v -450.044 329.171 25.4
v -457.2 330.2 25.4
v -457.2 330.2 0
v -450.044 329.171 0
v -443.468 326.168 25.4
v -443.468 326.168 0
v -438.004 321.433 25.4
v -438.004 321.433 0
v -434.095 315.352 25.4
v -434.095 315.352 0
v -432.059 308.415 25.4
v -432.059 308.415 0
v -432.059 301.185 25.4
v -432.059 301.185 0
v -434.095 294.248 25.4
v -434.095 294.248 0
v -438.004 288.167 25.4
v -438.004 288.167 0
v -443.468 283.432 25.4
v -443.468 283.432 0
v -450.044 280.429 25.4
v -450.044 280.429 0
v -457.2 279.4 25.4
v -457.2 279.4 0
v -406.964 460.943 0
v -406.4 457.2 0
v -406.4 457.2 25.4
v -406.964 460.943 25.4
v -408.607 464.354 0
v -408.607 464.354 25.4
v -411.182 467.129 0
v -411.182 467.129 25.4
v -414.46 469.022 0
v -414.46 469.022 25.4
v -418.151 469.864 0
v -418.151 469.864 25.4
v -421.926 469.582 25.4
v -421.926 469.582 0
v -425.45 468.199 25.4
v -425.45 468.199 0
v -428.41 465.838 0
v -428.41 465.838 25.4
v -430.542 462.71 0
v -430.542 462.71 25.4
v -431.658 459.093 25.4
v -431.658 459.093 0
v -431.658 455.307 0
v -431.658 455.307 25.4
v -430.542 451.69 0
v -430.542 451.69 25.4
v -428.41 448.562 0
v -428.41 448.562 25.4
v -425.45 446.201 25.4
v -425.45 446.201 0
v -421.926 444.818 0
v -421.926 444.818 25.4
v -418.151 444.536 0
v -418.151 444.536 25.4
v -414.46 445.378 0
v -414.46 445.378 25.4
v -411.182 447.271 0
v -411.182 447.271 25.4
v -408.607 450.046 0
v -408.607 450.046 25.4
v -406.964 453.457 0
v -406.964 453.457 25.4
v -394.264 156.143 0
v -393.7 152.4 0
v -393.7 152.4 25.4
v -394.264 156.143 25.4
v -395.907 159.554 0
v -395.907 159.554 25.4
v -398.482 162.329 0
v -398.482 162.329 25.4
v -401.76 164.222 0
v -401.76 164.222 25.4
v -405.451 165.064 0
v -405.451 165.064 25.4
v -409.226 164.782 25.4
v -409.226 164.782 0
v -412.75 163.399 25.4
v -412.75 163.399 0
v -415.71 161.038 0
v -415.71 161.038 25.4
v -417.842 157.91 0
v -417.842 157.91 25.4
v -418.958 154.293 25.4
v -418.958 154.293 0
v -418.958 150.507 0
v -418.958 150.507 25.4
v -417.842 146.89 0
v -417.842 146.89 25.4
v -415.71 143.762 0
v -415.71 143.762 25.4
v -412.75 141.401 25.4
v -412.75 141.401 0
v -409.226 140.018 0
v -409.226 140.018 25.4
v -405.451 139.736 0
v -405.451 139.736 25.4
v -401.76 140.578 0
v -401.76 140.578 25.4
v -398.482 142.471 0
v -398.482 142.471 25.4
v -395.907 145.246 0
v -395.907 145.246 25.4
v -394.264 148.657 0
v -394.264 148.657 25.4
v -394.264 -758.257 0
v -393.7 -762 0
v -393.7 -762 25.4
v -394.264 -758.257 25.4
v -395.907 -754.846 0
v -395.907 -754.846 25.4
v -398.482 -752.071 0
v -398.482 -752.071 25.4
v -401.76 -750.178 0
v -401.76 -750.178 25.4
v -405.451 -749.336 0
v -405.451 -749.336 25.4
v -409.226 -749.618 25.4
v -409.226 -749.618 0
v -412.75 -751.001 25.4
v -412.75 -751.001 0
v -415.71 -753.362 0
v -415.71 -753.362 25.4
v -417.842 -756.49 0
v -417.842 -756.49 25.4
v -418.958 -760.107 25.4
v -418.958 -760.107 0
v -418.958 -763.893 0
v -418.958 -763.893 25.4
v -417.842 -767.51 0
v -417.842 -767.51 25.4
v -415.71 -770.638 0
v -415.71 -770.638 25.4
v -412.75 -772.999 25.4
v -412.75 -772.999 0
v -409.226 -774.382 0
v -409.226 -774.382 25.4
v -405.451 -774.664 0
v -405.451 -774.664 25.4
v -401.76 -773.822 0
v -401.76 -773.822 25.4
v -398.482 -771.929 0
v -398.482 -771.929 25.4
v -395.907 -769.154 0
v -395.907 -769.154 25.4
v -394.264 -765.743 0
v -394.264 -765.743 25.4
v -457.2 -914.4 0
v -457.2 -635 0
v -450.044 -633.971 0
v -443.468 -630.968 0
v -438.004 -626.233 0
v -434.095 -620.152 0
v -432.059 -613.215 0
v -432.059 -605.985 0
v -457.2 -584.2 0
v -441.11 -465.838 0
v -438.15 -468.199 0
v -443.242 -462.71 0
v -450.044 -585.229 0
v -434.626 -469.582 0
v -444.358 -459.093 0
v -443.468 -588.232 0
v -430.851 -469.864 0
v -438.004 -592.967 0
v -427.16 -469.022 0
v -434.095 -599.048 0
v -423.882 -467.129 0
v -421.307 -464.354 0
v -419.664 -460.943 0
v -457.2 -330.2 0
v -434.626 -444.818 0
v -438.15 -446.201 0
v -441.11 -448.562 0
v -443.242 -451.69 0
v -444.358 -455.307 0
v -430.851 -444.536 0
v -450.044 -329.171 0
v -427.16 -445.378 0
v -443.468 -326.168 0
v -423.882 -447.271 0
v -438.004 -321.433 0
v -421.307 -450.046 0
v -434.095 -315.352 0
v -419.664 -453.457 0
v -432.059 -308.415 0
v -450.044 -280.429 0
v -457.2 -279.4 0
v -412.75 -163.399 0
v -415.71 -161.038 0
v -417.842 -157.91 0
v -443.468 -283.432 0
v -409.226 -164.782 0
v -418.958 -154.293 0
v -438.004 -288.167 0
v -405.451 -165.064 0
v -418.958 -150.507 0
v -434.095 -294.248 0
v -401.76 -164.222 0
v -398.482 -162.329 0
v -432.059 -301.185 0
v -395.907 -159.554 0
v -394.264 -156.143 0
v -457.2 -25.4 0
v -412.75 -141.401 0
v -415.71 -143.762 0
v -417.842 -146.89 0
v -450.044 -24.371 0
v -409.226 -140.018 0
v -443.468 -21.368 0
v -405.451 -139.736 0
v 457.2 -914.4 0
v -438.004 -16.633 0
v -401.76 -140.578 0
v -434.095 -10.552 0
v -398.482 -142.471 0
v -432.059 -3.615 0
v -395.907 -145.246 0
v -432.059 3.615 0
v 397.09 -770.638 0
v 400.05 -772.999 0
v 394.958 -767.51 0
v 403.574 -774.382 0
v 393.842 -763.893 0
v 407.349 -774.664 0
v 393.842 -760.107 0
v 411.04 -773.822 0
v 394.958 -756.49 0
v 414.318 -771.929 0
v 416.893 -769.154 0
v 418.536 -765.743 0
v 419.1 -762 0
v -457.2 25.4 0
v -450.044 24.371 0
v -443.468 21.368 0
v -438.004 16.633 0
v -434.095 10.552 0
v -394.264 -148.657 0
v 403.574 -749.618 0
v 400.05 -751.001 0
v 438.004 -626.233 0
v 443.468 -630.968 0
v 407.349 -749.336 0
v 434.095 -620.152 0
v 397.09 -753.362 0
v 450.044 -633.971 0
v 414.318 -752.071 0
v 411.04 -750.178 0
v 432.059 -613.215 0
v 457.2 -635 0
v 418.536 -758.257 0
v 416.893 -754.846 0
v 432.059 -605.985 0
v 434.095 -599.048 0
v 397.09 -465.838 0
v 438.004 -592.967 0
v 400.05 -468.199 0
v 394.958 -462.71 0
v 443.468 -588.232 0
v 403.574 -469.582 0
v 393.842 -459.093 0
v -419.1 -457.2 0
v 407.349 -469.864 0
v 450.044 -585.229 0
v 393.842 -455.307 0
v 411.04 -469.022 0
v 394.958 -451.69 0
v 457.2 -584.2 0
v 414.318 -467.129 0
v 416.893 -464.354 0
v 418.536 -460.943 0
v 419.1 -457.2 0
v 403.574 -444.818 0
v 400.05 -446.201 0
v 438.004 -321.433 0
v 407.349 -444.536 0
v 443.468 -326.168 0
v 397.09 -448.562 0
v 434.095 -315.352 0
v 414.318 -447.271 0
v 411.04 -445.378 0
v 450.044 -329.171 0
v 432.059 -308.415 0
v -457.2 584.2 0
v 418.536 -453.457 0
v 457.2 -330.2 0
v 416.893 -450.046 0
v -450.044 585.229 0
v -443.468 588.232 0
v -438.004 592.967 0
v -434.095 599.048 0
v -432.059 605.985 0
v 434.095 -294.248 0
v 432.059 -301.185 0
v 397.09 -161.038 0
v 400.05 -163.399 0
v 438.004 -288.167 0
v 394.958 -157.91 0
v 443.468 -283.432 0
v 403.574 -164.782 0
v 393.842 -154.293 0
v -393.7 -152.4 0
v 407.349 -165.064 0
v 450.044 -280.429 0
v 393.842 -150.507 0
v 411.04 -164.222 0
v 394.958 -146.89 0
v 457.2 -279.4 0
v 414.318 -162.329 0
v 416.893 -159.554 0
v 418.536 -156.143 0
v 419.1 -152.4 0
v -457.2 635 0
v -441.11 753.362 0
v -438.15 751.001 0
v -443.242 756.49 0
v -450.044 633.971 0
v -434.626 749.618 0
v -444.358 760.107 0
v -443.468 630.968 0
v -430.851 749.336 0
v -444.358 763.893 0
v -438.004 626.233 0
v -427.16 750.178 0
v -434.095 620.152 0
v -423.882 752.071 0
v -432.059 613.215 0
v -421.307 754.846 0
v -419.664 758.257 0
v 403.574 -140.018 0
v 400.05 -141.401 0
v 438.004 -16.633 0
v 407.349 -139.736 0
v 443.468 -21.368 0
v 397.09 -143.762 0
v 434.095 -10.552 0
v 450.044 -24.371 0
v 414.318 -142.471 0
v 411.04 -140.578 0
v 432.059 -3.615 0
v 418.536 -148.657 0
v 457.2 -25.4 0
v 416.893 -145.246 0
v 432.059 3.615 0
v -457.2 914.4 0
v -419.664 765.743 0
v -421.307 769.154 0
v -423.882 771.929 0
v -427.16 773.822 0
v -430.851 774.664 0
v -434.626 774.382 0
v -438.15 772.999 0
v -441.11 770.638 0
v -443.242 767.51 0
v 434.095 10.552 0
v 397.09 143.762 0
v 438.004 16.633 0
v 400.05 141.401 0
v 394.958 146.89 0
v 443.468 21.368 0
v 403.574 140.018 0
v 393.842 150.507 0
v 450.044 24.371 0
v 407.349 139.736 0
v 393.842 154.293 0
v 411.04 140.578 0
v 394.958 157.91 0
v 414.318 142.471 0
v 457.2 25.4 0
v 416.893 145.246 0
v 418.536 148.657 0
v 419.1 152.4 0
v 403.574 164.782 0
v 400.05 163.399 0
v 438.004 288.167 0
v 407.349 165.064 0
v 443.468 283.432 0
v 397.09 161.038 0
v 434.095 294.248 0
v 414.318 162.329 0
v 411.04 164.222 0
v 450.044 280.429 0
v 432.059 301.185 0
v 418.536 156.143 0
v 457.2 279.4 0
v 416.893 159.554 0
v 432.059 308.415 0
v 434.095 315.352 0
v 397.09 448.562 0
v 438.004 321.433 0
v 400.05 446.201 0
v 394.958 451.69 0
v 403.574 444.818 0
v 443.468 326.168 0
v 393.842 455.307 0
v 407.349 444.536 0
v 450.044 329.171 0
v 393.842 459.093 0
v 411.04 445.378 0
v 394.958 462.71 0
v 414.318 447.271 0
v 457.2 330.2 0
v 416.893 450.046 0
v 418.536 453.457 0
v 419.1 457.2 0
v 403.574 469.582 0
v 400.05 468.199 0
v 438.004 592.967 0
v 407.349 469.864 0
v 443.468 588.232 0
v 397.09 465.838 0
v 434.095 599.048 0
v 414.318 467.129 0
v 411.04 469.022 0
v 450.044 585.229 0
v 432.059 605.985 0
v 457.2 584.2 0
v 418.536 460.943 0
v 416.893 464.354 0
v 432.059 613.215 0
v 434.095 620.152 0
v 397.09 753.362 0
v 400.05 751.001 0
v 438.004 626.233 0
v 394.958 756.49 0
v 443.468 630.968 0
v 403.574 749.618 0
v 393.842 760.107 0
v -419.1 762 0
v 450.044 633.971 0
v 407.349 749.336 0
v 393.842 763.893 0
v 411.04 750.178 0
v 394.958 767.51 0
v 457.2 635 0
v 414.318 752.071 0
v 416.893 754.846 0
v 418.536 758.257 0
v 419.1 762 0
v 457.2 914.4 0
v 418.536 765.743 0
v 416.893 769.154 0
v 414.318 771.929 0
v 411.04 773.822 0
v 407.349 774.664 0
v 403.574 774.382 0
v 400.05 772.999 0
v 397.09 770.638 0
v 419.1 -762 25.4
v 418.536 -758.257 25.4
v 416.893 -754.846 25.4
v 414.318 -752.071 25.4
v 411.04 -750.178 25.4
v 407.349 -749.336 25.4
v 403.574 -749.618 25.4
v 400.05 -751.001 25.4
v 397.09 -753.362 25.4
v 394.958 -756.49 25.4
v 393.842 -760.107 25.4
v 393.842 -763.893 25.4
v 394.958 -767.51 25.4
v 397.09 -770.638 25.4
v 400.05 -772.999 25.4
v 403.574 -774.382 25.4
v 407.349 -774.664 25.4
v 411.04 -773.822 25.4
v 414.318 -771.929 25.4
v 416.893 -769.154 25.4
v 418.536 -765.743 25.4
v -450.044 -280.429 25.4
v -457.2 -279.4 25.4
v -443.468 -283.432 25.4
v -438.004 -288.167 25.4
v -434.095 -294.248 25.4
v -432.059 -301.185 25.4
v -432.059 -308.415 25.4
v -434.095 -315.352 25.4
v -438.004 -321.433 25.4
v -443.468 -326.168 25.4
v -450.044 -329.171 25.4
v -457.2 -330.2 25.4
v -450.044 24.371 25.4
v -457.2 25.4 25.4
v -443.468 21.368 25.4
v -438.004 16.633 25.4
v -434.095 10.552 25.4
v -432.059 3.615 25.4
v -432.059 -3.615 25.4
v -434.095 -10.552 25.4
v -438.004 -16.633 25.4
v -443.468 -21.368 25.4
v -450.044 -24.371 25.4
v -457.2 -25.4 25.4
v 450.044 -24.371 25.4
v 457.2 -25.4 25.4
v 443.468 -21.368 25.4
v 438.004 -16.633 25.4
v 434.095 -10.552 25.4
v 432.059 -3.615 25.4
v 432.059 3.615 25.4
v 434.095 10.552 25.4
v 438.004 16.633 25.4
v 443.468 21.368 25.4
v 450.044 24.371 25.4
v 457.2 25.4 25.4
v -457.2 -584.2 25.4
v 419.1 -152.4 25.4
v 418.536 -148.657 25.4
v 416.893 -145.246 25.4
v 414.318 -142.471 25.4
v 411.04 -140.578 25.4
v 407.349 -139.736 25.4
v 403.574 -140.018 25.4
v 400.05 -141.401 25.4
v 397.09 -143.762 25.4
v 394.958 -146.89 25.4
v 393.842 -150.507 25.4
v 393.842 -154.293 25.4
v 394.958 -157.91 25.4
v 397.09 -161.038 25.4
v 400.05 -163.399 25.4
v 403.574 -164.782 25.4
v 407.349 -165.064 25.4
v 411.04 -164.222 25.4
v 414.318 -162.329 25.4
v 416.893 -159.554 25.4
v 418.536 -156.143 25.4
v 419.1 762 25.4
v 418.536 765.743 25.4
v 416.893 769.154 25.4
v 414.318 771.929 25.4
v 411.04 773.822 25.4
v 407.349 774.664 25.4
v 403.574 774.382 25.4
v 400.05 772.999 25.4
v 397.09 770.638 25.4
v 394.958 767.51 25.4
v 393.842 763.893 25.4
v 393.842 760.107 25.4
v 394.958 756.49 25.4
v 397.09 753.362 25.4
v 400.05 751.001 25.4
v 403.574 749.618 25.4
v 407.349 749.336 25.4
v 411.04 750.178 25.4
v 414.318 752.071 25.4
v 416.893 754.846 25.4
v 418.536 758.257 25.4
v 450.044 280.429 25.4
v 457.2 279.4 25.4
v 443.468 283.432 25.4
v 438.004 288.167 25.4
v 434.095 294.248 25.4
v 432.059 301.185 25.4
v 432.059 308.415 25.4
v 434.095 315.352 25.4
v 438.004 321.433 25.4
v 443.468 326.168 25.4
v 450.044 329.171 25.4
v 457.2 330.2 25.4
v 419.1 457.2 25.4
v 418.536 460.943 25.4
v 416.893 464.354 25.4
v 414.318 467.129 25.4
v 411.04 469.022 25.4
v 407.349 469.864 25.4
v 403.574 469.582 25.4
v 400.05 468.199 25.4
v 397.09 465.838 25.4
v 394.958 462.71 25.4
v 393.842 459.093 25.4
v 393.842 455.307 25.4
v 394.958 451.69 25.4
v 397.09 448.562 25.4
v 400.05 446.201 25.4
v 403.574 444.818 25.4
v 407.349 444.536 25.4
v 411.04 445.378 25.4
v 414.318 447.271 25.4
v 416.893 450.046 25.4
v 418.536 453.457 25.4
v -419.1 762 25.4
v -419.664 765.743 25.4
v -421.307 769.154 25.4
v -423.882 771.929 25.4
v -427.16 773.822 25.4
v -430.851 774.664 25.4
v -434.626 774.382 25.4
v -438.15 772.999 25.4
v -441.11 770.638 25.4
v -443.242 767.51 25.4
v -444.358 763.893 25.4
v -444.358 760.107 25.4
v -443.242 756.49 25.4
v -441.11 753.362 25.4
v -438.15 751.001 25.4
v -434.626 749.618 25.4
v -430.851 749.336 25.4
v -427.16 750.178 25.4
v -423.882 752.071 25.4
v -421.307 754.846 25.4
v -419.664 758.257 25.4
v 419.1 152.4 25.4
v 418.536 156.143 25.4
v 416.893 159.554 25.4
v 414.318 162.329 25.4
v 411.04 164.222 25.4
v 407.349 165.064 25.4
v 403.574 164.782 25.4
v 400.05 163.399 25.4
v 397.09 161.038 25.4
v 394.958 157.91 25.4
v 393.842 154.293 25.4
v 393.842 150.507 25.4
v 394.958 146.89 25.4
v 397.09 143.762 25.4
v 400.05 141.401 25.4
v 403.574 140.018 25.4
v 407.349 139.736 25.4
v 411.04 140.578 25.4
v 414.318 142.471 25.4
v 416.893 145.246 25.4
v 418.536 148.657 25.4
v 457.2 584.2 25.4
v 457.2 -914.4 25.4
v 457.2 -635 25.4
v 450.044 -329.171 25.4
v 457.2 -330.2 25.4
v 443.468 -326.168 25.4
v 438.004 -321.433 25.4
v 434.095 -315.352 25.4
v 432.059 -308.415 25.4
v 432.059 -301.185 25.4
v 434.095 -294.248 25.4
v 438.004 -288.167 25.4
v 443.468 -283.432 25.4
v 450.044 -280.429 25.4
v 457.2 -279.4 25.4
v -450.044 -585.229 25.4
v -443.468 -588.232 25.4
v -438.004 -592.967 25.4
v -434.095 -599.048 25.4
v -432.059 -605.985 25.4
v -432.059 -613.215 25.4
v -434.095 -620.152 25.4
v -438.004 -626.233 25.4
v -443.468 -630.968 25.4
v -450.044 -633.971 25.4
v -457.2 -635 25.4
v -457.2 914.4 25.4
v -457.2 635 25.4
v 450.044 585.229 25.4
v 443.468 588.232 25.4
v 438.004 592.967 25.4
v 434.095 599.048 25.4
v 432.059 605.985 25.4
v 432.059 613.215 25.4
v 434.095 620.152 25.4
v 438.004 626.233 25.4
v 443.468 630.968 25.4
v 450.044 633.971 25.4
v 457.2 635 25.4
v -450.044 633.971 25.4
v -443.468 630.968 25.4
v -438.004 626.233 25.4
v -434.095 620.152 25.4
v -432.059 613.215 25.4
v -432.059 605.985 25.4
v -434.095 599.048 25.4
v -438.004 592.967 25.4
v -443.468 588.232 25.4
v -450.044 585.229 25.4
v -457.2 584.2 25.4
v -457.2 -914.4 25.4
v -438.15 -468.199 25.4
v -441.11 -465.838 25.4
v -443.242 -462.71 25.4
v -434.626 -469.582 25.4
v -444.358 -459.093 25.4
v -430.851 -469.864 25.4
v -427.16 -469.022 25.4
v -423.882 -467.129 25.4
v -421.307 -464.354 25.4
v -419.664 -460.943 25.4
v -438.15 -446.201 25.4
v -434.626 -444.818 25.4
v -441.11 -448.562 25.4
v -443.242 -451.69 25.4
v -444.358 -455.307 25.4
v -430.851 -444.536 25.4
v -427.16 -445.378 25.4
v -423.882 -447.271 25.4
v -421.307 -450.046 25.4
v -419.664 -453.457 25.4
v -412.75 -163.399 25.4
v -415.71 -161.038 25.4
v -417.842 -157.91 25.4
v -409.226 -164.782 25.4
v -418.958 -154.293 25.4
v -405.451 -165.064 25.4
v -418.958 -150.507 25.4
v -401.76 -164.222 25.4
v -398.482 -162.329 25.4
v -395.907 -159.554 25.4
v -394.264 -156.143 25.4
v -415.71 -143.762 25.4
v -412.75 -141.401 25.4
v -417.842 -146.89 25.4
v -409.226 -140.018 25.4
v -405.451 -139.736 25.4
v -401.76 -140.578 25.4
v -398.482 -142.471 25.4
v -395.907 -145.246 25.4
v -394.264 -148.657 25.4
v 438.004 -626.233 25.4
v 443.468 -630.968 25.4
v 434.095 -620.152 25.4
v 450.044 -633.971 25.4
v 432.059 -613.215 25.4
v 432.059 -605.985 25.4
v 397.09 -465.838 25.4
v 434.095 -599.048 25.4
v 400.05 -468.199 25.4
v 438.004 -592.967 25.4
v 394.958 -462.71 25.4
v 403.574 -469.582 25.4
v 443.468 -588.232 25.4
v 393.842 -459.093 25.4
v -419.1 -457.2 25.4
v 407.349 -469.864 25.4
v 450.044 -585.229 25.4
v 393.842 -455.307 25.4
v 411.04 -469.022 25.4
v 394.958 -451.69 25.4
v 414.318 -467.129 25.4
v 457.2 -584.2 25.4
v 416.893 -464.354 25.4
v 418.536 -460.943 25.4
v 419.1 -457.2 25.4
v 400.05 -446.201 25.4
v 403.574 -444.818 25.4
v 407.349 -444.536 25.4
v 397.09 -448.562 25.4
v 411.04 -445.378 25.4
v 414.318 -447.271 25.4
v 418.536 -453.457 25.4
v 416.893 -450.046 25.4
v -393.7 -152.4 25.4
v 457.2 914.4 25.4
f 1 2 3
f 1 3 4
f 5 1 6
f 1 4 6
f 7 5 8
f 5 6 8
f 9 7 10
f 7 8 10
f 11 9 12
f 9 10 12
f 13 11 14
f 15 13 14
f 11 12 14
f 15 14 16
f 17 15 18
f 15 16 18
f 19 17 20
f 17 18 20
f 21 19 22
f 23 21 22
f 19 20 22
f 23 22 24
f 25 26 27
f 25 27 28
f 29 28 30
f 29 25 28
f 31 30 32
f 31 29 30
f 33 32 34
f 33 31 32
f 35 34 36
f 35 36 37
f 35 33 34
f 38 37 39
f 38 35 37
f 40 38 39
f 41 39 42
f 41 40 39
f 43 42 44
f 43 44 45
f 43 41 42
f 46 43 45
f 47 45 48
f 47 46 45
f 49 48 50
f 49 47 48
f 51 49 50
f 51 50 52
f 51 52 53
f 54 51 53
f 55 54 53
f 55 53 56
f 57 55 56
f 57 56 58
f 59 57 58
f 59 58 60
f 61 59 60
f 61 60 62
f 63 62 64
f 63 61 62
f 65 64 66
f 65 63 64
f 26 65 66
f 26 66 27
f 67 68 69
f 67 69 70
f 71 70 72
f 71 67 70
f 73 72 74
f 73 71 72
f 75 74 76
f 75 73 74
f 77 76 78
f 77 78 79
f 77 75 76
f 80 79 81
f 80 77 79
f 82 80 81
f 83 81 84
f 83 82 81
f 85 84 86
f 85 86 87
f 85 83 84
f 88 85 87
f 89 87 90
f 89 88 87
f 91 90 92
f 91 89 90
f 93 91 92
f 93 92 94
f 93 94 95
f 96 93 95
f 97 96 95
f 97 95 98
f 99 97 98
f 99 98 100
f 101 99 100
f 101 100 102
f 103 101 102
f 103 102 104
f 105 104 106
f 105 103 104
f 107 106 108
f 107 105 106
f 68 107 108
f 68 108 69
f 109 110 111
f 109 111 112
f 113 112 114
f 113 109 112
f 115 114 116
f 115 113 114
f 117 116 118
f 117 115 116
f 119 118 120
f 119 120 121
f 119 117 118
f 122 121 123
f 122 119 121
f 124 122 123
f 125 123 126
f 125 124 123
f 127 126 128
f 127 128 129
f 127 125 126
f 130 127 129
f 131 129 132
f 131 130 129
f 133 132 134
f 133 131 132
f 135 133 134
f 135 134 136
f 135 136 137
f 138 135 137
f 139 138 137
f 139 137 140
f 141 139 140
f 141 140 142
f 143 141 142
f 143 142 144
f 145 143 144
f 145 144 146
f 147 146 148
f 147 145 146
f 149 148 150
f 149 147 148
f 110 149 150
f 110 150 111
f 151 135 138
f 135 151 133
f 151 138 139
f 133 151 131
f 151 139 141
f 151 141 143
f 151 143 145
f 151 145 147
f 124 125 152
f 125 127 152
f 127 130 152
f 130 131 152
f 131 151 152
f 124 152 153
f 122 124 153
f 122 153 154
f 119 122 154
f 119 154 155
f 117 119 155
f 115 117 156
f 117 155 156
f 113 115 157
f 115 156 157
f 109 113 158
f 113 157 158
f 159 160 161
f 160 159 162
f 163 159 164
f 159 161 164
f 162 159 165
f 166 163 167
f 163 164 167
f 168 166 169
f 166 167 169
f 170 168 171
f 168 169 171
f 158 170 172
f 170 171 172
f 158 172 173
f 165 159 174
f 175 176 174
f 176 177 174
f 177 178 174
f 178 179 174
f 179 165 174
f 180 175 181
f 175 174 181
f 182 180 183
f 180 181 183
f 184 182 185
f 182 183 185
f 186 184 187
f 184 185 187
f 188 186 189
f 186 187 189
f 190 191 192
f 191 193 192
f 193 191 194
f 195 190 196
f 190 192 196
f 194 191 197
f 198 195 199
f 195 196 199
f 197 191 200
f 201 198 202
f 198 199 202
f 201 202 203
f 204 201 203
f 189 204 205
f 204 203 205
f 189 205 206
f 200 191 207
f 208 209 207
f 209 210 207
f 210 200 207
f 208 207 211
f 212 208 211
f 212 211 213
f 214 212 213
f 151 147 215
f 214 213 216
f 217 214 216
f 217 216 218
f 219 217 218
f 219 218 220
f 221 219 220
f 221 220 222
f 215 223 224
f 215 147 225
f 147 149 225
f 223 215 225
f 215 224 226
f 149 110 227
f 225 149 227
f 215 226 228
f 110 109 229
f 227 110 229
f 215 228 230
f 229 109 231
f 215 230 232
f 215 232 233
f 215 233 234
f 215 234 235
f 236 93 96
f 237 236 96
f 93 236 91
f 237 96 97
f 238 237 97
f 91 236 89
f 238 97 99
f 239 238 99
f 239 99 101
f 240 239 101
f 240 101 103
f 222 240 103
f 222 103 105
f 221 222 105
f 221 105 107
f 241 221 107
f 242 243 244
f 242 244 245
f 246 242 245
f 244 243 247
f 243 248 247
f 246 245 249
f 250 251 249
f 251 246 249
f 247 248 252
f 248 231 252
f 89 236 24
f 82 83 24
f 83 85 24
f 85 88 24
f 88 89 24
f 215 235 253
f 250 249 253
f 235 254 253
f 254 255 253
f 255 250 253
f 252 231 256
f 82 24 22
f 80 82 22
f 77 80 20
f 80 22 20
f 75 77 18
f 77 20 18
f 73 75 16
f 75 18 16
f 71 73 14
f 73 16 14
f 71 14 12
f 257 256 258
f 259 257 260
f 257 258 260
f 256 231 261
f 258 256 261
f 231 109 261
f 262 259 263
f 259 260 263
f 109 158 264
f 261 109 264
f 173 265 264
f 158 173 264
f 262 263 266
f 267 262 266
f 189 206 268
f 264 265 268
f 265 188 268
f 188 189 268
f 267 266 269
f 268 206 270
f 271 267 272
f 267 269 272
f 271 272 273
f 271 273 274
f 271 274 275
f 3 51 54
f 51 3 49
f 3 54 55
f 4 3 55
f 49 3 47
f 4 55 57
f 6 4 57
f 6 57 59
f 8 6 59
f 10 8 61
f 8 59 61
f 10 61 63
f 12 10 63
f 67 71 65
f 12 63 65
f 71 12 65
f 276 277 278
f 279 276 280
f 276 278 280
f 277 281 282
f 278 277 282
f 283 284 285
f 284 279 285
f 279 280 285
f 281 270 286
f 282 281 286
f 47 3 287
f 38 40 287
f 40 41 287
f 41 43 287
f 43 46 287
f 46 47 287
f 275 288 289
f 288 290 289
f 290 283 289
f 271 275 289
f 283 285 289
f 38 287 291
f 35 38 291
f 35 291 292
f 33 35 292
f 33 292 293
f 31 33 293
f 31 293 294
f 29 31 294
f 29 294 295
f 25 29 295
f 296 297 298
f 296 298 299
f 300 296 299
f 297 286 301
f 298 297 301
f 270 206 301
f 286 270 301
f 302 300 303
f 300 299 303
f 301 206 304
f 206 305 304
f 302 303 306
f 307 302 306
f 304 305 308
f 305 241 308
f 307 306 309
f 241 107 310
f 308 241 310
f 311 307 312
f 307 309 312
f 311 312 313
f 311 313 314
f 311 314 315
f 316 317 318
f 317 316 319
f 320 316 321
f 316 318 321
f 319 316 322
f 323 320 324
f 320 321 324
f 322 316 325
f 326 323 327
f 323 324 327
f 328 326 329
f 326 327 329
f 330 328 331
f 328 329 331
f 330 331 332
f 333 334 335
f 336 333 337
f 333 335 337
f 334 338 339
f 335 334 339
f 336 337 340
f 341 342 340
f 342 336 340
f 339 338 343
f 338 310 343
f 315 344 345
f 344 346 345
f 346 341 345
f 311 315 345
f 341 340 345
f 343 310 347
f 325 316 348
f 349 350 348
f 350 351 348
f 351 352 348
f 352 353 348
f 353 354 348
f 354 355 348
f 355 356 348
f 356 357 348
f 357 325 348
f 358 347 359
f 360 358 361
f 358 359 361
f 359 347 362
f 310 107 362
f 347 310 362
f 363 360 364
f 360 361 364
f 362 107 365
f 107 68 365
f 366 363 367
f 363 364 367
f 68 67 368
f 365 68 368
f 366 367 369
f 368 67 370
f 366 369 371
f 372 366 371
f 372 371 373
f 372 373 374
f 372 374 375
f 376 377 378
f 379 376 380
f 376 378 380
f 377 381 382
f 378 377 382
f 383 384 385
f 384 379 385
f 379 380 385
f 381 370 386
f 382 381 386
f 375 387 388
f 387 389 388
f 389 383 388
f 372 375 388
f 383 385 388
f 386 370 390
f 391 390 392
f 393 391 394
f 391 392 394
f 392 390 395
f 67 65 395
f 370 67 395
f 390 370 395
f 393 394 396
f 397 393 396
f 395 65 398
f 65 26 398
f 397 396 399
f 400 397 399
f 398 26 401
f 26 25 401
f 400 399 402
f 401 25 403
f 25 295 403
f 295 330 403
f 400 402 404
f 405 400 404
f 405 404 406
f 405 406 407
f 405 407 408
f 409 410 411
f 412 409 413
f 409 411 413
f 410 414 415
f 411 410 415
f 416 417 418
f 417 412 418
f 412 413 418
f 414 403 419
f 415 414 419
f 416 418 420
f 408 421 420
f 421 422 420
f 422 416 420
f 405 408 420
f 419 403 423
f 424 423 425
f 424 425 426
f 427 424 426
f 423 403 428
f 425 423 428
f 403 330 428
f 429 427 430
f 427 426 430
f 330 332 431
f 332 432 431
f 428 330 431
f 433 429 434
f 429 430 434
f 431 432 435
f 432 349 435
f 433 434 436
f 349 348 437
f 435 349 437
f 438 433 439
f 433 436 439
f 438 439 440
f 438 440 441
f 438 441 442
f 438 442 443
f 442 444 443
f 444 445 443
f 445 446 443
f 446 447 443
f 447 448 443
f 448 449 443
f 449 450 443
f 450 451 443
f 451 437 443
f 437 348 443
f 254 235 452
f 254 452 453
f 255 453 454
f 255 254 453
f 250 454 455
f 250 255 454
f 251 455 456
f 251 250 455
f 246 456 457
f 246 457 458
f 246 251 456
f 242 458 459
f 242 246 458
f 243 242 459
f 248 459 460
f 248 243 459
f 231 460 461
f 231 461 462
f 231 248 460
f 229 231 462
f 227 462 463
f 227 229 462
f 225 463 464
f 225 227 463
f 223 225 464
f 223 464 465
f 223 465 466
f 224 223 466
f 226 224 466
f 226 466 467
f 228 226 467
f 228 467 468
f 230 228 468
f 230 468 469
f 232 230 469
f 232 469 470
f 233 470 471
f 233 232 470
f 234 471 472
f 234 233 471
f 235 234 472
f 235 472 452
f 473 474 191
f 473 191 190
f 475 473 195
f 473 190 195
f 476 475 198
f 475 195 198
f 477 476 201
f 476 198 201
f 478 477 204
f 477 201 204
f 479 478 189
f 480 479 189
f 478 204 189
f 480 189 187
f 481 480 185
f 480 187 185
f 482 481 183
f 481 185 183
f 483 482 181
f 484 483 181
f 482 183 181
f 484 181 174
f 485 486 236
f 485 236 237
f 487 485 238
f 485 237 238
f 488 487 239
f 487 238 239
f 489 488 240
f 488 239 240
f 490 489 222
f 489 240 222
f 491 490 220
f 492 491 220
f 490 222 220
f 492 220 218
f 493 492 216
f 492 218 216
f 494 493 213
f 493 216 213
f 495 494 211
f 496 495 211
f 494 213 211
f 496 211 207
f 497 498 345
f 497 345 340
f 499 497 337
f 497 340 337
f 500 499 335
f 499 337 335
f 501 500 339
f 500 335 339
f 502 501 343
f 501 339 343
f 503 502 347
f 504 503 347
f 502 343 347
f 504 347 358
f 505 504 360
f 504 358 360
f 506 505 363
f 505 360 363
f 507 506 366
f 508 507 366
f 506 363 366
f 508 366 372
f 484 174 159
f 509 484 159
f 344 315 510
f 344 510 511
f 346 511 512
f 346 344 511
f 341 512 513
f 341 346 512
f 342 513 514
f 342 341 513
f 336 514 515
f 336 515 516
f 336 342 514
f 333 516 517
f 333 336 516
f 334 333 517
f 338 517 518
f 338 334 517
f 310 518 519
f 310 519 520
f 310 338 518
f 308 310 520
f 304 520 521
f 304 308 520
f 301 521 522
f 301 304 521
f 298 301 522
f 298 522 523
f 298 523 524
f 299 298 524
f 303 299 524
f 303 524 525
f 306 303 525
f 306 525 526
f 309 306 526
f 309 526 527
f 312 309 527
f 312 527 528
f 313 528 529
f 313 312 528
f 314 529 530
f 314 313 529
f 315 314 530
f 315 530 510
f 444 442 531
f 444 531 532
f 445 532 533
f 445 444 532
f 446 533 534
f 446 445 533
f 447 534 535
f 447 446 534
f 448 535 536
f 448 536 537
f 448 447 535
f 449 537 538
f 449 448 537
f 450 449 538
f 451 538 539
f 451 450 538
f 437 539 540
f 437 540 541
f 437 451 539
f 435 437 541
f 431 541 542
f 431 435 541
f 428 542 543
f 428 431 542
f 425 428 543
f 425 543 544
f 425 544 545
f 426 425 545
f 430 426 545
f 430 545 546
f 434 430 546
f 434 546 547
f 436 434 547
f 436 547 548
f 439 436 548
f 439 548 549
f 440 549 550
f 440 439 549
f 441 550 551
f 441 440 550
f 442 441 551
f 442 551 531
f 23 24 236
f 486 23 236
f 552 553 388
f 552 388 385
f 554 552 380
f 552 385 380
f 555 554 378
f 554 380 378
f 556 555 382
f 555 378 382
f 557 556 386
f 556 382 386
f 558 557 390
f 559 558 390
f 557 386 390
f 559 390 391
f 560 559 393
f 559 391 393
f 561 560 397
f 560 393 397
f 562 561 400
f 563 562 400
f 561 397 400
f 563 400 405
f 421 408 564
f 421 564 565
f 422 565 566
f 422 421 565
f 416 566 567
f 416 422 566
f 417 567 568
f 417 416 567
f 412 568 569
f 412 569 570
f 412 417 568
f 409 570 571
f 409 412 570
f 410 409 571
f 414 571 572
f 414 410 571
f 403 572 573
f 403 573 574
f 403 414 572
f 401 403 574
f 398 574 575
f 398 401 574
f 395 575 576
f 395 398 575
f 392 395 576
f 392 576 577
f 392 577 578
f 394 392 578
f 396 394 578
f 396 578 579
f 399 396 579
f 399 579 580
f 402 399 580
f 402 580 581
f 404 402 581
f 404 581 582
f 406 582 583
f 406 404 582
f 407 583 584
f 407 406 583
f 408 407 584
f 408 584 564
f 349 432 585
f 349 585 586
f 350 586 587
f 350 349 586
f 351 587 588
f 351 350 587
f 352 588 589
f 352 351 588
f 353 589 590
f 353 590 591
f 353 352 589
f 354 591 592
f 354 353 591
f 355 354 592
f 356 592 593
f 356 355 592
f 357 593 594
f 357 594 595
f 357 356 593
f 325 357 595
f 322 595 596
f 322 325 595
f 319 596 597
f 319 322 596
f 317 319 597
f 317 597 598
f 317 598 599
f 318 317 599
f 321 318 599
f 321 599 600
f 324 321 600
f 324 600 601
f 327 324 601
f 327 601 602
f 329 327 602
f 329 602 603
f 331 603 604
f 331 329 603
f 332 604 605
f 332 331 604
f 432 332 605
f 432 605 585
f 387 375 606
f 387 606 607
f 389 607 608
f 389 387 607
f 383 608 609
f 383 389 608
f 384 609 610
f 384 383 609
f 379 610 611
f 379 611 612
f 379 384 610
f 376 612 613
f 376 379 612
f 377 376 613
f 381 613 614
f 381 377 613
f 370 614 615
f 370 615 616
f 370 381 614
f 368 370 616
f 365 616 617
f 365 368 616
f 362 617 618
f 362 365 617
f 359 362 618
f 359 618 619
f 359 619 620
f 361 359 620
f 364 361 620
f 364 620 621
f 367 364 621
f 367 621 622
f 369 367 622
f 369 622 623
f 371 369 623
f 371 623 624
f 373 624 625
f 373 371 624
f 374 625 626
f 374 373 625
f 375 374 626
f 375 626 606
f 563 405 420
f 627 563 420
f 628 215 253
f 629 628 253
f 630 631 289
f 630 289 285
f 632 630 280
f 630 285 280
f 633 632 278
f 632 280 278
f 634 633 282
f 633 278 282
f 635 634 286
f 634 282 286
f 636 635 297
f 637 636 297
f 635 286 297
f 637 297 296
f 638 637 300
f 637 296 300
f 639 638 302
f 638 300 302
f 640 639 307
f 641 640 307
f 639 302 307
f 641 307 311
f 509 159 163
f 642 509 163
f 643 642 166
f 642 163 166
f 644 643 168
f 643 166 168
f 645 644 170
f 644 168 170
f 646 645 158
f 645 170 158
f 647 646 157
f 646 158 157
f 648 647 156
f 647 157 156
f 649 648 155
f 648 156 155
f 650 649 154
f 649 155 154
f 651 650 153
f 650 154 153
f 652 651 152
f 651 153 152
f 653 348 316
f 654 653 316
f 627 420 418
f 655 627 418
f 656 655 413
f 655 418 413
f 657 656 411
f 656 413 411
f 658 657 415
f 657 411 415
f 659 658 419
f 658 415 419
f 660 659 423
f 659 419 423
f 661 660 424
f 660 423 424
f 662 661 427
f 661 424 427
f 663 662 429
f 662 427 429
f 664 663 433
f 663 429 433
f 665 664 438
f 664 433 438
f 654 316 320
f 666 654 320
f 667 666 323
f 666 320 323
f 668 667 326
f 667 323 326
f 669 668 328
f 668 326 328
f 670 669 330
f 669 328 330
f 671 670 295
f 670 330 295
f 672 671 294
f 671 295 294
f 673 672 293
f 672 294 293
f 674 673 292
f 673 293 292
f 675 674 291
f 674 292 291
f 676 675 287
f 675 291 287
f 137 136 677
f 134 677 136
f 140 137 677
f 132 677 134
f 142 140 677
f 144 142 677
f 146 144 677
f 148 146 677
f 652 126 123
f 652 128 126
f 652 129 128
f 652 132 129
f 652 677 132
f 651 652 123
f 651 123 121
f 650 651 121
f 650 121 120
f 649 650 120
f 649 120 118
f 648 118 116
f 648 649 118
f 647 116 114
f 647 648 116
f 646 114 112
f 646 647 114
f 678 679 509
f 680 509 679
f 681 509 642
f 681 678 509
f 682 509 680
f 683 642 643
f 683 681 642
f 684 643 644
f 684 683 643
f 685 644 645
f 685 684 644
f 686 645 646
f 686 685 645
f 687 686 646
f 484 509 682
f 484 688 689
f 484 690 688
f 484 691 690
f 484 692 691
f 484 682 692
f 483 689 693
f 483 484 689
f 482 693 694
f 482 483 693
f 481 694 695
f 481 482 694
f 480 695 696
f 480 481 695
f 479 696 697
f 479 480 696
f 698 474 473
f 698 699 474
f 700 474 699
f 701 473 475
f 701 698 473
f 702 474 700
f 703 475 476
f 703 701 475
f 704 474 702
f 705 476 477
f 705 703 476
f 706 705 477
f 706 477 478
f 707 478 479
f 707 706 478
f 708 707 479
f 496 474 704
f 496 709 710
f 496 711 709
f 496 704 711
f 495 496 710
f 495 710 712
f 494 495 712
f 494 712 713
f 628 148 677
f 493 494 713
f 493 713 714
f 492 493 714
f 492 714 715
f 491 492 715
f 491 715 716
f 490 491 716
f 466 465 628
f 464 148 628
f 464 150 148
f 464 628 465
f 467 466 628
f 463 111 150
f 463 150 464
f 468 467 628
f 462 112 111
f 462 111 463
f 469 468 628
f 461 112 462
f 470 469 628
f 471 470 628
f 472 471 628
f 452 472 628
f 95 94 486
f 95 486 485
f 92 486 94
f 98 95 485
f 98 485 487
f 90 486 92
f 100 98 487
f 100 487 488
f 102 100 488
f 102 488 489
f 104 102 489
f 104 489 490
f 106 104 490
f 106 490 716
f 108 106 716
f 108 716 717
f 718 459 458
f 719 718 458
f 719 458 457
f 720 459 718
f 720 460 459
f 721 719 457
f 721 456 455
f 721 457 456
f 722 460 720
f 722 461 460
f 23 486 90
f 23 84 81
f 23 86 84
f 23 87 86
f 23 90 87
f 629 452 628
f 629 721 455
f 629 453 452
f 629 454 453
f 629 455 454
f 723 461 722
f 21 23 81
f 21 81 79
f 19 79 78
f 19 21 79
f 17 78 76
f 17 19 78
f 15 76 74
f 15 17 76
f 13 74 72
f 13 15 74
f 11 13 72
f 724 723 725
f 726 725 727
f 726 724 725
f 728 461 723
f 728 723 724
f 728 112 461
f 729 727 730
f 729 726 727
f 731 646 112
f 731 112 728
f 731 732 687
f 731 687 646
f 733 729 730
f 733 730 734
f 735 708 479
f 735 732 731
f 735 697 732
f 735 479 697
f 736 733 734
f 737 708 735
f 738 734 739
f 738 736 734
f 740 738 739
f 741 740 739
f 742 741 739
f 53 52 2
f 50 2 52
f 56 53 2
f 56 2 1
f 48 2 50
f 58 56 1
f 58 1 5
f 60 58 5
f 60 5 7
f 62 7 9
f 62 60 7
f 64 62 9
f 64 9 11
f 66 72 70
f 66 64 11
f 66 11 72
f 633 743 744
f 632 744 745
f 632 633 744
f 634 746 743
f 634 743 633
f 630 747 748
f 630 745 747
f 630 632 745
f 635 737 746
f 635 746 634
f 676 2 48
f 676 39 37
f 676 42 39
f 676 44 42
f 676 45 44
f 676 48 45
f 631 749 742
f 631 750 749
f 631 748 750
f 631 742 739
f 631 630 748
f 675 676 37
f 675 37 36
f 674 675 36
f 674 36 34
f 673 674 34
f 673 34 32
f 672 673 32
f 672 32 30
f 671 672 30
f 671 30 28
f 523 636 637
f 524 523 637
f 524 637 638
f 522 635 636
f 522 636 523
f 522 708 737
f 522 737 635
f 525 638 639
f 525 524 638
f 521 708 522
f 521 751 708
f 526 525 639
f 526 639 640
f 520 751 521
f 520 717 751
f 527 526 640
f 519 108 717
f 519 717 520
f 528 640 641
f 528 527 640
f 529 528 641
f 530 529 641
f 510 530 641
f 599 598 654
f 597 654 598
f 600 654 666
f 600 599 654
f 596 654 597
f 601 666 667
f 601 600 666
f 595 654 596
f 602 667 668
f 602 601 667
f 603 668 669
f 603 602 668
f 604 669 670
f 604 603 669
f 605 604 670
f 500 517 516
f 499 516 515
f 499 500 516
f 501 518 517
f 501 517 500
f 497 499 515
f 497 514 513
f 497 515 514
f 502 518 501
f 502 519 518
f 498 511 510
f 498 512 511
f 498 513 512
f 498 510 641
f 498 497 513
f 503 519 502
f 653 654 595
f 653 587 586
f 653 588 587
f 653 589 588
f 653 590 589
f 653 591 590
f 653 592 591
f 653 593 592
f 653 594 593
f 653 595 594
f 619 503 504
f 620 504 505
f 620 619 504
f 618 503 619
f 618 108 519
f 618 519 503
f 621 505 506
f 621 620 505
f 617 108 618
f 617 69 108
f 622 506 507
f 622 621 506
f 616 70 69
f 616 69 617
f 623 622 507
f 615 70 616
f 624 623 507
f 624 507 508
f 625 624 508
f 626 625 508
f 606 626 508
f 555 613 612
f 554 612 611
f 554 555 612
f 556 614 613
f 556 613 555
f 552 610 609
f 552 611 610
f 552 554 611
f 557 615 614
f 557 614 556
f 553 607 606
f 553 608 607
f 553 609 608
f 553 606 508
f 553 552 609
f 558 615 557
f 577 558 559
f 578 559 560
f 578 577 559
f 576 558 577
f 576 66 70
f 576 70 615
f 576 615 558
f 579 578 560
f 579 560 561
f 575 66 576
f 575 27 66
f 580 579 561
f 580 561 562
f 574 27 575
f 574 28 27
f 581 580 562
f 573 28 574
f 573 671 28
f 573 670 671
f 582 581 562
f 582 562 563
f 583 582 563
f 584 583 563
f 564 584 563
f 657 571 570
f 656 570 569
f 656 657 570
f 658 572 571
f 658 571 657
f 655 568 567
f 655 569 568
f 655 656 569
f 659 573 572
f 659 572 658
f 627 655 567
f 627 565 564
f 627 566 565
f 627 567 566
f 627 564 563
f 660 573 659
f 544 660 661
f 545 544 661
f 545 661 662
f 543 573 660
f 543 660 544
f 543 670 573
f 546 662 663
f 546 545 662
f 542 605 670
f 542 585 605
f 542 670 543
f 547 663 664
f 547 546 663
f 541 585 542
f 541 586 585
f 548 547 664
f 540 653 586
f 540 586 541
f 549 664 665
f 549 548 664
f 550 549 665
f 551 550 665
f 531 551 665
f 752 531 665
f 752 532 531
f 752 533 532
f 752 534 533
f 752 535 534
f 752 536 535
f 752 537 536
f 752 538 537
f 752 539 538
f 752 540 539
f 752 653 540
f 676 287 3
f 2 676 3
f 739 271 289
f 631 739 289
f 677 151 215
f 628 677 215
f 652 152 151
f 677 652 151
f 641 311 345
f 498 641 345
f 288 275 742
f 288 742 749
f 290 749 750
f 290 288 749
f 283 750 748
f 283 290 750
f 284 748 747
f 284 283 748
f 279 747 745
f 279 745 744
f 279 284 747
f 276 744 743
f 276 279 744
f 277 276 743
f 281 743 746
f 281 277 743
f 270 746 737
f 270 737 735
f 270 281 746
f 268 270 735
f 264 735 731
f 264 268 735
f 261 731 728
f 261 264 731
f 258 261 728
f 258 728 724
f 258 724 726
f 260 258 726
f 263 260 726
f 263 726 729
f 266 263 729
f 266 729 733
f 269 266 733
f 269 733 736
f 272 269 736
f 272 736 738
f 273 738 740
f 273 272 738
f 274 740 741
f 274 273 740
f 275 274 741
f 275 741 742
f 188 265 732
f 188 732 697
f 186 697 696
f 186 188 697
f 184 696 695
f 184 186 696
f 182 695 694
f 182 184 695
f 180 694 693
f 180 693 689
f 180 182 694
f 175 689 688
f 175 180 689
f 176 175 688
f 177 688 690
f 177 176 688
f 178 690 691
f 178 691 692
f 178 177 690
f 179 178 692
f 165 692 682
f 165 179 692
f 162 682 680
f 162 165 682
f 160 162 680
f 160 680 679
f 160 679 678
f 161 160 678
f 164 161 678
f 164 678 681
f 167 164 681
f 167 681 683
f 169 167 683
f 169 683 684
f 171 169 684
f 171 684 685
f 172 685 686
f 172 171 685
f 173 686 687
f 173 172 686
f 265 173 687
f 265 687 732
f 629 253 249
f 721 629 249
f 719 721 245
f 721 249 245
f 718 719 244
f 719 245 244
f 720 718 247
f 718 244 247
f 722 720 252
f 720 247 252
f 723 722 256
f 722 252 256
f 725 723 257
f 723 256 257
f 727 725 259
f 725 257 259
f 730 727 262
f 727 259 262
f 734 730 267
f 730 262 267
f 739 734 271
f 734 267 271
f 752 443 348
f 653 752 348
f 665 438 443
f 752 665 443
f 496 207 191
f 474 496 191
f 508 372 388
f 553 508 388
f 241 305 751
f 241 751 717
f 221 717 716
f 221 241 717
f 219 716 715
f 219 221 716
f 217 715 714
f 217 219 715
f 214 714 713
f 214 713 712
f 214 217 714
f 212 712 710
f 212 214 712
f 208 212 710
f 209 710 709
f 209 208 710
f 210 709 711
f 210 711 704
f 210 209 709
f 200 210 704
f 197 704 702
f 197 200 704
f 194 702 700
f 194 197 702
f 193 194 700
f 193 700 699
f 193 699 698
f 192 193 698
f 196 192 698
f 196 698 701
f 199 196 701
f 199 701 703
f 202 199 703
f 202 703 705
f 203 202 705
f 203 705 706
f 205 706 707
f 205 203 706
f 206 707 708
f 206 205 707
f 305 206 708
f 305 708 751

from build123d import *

# Parameters (mm, degrees)
F0_R     = 12.7
F1_DEPTH = 25.4


with BuildPart() as f1:
    # F0 (on Top) → F1 (new body)
    with BuildSketch(Plane.XY):
        with BuildLine():
            Line((-457.2, -914.4), (457.2, -914.4))
            Line((457.2, -914.4), (457.2, -635))
            ThreePointArc((457.2, -635), (431.8, -609.6), (457.2, -584.2))
            Line((457.2, -584.2), (457.2, -330.2))
            ThreePointArc((457.2, -330.2), (431.8, -304.8), (457.2, -279.4))
            Line((457.2, -279.4), (457.2, -25.4))
            ThreePointArc((457.2, -25.4), (431.8, 0), (457.2, 25.4))
            Line((457.2, 25.4), (457.2, 279.4))
            ThreePointArc((457.2, 279.4), (431.8, 304.8), (457.2, 330.2))
            Line((457.2, 330.2), (457.2, 584.2))
            ThreePointArc((457.2, 584.2), (431.8, 609.6), (457.2, 635))
            Line((457.2, 635), (457.2, 914.4))
            Line((457.2, 914.4), (-457.2, 914.4))
            Line((-457.2, 914.4), (-457.2, 635))
            ThreePointArc((-457.2, 635), (-431.8, 609.6), (-457.2, 584.2))
            Line((-457.2, 584.2), (-457.2, 330.2))
            ThreePointArc((-457.2, 330.2), (-431.8, 304.8), (-457.2, 279.4))
            Line((-457.2, 279.4), (-457.2, 25.4))
            ThreePointArc((-457.2, 25.4), (-431.8, 0), (-457.2, -25.4))
            Line((-457.2, -25.4), (-457.2, -279.4))
            ThreePointArc((-457.2, -279.4), (-431.8, -304.8), (-457.2, -330.2))
            Line((-457.2, -330.2), (-457.2, -584.2))
            ThreePointArc((-457.2, -584.2), (-431.8, -609.6), (-457.2, -635))
            Line((-457.2, -635), (-457.2, -914.4))
        make_face()
        with Locations((-406.4, -762)):
            Circle(F0_R, mode=Mode.SUBTRACT)
        with Locations((-431.8, -457.2)):
            Circle(F0_R, mode=Mode.SUBTRACT)
        with Locations((-406.4, -152.4)):
            Circle(F0_R, mode=Mode.SUBTRACT)
        with Locations((406.4, -762)):
            Circle(F0_R, mode=Mode.SUBTRACT)
        with Locations((406.4, -457.2)):
            Circle(F0_R, mode=Mode.SUBTRACT)
        with Locations((406.4, -152.4)):
            Circle(F0_R, mode=Mode.SUBTRACT)
        with Locations((-406.4, 152.4)):
            Circle(F0_R, mode=Mode.SUBTRACT)
        with Locations((-419.1, 457.2)):
            Circle(F0_R, mode=Mode.SUBTRACT)
        with Locations((-431.8, 762)):
            Circle(F0_R, mode=Mode.SUBTRACT)
        with Locations((406.4, 152.4)):
            Circle(F0_R, mode=Mode.SUBTRACT)
        with Locations((406.4, 457.2)):
            Circle(F0_R, mode=Mode.SUBTRACT)
        with Locations((406.4, 762)):
            Circle(F0_R, mode=Mode.SUBTRACT)
    extrude(amount=F1_DEPTH)


solid = f1.part
